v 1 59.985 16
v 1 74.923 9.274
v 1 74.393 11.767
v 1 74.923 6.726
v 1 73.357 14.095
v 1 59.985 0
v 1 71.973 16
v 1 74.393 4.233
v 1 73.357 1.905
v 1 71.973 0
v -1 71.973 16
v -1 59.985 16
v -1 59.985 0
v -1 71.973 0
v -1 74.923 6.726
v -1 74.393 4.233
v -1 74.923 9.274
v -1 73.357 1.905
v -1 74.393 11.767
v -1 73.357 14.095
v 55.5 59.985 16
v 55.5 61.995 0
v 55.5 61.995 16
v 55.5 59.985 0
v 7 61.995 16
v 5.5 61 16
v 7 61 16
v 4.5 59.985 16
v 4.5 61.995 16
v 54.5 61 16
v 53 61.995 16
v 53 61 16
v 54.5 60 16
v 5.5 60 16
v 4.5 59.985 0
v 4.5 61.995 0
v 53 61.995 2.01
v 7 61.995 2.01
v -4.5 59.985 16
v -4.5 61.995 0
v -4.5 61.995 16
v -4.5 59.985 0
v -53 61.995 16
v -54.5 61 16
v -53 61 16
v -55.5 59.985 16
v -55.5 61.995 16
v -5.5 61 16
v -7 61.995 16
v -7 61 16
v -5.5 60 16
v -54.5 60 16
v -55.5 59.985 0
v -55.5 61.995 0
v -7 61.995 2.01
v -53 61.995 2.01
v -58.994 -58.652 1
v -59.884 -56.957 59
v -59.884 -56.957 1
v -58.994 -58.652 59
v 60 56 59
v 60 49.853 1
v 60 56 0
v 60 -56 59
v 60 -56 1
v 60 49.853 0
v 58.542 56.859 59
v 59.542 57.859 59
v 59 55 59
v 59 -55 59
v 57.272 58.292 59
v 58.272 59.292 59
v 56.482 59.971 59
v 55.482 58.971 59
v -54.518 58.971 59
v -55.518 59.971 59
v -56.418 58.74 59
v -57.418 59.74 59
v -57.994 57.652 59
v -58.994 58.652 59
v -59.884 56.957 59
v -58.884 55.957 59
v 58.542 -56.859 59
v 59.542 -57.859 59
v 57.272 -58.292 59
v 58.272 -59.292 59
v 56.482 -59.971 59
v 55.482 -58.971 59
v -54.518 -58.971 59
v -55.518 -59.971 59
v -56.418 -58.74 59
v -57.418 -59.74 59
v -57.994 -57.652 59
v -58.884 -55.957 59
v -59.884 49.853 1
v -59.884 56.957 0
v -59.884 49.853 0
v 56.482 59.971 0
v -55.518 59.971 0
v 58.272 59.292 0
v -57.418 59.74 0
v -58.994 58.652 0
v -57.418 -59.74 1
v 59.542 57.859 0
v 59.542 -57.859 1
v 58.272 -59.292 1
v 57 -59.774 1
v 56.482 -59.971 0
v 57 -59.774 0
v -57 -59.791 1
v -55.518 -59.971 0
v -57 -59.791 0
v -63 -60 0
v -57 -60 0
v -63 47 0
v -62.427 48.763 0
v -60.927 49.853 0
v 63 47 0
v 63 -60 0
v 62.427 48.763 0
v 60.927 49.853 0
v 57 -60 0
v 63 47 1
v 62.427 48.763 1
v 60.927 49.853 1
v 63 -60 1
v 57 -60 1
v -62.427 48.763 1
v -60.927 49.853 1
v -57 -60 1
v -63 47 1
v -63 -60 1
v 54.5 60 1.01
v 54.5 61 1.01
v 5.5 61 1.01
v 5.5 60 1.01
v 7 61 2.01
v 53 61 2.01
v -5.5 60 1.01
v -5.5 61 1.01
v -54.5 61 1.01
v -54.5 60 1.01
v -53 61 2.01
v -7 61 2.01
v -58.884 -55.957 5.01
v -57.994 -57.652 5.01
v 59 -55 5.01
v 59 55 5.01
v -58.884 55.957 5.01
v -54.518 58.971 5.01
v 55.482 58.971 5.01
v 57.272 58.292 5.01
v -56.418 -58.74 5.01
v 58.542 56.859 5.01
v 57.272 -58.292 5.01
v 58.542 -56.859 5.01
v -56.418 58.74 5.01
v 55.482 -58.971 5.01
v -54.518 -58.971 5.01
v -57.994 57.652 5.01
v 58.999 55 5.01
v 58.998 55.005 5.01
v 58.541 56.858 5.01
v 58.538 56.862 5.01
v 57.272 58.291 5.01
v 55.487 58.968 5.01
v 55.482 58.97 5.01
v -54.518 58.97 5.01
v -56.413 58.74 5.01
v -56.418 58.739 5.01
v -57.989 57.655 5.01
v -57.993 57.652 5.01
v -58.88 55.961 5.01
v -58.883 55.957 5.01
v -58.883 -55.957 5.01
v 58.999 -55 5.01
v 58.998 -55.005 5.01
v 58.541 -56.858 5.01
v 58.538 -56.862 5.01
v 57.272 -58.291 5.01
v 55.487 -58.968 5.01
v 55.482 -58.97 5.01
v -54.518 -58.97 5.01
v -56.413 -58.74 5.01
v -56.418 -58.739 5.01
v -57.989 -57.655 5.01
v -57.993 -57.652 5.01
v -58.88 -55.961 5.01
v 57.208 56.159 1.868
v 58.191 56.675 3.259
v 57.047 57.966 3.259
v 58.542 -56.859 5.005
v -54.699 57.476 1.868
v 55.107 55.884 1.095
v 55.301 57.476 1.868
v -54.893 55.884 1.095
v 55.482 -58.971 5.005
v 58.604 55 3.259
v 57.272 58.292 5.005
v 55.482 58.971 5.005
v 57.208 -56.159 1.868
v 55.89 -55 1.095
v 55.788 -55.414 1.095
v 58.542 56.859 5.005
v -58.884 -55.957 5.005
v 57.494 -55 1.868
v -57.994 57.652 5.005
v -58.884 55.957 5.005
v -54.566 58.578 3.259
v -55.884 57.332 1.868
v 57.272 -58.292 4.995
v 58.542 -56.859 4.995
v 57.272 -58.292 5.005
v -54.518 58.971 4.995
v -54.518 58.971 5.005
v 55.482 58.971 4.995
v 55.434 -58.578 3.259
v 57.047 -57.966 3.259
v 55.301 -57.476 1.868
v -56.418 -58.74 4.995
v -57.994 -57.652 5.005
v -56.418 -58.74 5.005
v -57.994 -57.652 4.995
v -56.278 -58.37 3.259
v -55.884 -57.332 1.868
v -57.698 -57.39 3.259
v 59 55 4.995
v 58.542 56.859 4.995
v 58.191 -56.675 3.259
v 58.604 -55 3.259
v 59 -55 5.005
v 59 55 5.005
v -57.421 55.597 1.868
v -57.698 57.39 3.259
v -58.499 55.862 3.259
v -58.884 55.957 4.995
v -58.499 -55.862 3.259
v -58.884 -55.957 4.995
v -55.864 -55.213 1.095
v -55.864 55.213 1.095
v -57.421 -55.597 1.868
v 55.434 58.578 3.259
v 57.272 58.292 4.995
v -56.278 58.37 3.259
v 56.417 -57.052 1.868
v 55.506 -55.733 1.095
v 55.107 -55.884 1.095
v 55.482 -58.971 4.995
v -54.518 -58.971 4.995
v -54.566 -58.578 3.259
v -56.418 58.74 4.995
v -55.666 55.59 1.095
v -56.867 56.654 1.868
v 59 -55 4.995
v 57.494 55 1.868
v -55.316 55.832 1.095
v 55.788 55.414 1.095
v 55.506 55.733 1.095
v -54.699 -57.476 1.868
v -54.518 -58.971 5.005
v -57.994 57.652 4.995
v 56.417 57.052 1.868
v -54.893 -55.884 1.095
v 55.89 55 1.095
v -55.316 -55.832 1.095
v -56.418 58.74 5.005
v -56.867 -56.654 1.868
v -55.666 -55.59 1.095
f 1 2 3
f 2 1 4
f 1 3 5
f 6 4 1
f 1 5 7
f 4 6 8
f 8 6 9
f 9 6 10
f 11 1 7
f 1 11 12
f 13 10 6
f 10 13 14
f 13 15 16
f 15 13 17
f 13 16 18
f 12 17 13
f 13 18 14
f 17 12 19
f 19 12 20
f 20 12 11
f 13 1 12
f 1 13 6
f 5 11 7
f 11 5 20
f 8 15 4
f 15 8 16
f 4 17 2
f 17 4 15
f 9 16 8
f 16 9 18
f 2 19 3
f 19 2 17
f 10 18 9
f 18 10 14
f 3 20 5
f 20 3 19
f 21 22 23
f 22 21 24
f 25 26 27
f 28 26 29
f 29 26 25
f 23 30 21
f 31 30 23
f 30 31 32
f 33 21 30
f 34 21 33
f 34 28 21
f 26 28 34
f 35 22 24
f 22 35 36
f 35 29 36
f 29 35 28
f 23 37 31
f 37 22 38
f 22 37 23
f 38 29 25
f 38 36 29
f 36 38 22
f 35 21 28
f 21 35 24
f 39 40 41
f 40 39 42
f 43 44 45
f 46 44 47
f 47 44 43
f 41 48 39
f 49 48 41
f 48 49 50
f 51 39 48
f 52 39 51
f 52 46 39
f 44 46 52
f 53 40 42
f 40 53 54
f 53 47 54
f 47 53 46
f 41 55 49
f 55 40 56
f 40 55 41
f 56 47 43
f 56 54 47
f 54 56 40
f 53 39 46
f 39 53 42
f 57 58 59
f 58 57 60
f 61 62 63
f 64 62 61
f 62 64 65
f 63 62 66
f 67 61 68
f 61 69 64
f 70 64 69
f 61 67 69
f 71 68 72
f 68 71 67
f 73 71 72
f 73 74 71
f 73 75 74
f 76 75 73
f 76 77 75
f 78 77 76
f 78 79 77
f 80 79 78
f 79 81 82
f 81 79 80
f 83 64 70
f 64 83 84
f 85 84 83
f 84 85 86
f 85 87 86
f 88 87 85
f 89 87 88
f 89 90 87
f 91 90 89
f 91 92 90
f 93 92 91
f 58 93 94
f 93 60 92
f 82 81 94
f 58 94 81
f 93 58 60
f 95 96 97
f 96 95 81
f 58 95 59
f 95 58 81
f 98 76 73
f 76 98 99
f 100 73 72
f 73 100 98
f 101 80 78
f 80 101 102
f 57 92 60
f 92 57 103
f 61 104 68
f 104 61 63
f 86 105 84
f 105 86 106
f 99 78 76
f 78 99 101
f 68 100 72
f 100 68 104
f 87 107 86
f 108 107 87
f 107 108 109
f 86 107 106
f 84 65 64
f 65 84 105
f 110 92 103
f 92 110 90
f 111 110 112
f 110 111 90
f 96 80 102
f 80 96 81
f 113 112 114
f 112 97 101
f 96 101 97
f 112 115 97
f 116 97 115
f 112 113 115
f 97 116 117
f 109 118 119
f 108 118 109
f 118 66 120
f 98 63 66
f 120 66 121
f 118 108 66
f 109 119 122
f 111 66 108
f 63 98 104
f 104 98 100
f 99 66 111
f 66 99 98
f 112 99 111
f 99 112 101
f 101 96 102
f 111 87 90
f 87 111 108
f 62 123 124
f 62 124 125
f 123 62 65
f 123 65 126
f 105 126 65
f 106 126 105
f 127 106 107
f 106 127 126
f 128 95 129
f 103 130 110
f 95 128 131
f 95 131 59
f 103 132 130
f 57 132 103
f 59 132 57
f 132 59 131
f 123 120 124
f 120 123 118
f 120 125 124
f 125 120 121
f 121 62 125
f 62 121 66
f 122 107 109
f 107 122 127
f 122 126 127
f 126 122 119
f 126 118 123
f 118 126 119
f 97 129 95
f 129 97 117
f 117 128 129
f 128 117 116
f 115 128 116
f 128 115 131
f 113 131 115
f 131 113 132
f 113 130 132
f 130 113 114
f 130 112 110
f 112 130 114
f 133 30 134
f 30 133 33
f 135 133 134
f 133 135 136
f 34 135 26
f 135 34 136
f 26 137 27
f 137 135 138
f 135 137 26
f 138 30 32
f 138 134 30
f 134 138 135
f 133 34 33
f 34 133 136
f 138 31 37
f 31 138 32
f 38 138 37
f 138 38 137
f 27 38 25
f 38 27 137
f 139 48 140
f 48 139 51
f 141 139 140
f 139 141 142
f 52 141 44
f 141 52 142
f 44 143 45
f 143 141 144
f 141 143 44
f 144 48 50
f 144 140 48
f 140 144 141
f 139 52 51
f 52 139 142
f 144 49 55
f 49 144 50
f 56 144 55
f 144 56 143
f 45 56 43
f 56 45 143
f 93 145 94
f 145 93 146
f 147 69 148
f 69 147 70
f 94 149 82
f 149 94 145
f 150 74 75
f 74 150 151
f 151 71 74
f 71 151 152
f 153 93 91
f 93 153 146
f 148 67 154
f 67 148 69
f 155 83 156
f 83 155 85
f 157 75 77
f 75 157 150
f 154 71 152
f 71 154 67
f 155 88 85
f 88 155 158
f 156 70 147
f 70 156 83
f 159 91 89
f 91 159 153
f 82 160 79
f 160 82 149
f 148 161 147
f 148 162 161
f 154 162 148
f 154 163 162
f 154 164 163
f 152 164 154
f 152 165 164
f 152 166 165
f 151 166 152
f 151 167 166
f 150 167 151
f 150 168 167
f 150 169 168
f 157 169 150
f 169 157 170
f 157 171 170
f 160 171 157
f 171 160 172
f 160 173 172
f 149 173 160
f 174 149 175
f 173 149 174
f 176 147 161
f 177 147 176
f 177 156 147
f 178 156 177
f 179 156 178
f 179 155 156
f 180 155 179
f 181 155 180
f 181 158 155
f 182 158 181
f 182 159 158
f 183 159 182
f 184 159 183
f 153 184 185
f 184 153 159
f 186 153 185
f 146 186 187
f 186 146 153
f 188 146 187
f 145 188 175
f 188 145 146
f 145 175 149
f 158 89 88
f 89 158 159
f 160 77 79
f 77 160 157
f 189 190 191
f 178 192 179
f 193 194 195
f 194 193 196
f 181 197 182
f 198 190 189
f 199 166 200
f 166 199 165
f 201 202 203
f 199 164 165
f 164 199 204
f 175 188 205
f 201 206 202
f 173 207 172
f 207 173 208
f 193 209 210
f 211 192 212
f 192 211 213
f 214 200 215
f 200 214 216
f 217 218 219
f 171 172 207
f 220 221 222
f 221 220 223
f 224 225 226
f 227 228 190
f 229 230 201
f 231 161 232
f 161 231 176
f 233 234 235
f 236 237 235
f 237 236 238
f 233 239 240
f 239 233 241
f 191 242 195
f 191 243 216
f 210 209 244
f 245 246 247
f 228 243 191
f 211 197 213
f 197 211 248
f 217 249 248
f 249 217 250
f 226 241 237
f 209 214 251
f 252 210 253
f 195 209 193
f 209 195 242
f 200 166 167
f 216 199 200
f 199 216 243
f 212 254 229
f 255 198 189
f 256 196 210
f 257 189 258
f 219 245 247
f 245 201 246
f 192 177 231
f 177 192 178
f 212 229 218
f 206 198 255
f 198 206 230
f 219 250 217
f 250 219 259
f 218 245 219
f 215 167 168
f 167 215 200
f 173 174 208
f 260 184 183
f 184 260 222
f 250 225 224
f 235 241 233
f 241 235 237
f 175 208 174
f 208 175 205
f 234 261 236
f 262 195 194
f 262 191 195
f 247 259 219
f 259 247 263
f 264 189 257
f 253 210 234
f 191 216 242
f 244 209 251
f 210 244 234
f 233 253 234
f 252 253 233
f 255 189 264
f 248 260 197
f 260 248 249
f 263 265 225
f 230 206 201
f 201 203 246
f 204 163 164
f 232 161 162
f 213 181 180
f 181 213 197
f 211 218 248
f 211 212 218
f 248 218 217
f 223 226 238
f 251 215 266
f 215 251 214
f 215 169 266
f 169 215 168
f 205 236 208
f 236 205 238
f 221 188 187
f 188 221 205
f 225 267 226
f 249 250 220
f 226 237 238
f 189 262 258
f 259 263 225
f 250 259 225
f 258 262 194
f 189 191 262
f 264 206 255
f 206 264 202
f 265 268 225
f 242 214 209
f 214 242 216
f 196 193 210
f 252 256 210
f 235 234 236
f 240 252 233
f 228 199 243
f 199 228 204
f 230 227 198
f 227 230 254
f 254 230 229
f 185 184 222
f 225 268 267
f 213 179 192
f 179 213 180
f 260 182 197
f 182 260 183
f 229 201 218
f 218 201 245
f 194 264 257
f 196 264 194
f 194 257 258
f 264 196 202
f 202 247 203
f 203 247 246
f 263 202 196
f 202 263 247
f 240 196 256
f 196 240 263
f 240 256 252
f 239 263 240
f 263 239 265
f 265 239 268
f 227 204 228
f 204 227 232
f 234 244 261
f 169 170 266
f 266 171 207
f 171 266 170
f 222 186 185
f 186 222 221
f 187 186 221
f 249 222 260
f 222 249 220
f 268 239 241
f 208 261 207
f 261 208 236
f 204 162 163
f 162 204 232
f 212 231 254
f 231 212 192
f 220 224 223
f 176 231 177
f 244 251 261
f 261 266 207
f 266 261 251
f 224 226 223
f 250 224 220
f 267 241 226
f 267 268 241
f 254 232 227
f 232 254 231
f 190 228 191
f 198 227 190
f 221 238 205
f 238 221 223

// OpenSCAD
// Customizable Ultimate Drawer System Drawer
// Remixed from MarcElbichon's Ultimate Drawer System https://www.thingiverse.com/thing:2302575 (CC-BY 4.0)
// Copyright (C) 2019 by Brian Alano (and possibly others)
// Licensed under the Creative Commons Attribution-NonCommercial-ShareAlike 4.0 (CC-BY-NC-SA 4.0)

/* Design notes
// width is x dimension, across the face of the drawer
// depth is y dimension, front to back of the drawer
// height is z dimension
*/

/* Coding Style Guide 
 * User parameters and modules use underscores between words.
 * Other variable names use camel case.
 * Separate features into their own modules if they are more than a couple lines long.
 * All dimensions should be assigned to variables, usually global ones so they can be found easily.
 * Keep local modules local.
 * Keep local variables local.
 * Maintain Thingiverse Customizer compatibility.
 * Maintain backwards compatibility with MarcElbichon's Ultimate Drawer System 
   (https://www.thingiverse.com/thing:2302575). This means a 1Ux1Ux1U drawer 
   made with this program will work in MarcElbichon's shelf. 
*/

/* [Size] */
// units wide (actual drawer width is 131*U_wide - 10)
U_wide=1; // [1, 1.5]
// units deep (actual drawer depth is 130*U_deep - 10)
U_deep=1; // [1, 1.5]
// units high (actual drawer height is 20*U_high - 1)
U_high=3; // [1:15]

/* [Features] */
// What kind of drawer pull?
pull_style = "original"; // ["original", "ergonomic"]
// modify the flange to allow for the drawer catch on the shelf?
drawer_catch = "no"; // ["yes", "no"]
// include slots on the back of the drawer for the locking mechanism
rear_lock_slot = "no"; // ["yes", "no"]

/* [Hidden] */
drawerUnit=[120, 120, 19];
shelfPadding=[11, 10, 1];

wallThickness = 1;
shelfUnit = [131, 130, 30];
shelf = [shelfUnit.x * U_wide, shelfUnit.y * U_deep, (shelfUnit.z - wallThickness*2) * U_high - wallThickness*2]; // reference dimension from shelf .scad file.
drawer = [shelf.x - shelfPadding.x, shelf.y - shelfPadding.y, shelf.z - shelfPadding.z];

cornerR = 4;
cornerD = cornerR * 2;
flangeR = 3;
flangeD = flangeR * 2;
flange = [3, d_to_y(U_deep)-10, 1];
pullD = 24.38;
pull = [2, pullD/2 + 2.8, 16];
label = [51, 2, 16];
labelSlot = [49, 1, 15];
labelWindow = [46, 1, 14];
catch = [flange.x * 0.4, d_to_y(U_deep) - 4, flange.z];
rearLockSlot = [26, 3.5, 8];

// utility variables
epsilon = 0.01;

// the spacing between drawings is 20, or drawerUnit.z + 1. so a 1U drawer is 19, a 2U drawer is 39, etc.
//FIXME replace with drawer[]
//FIXME put lock on bottom, not top.
function u_to_z(u) = (drawerUnit.z + shelfPadding.z) * u - shelfPadding.z;
function w_to_x(w) = (drawerUnit.x + shelfPadding.x) * w - shelfPadding.x;
function d_to_y(d) = (drawerUnit.y + shelfPadding.y) * d - shelfPadding.y;

module drawer() {
    module add() {
        // main body
        linear_extrude(u_to_z(U_high))
            roundtangle(width=w_to_x(U_wide), length=d_to_y(U_deep), radius=cornerR);
        // flanges
        linear_extrude(flange.z) 
            for (i = [1, -1]) {
                translate([w_to_x(U_wide)/2*i, -d_to_y(U_deep)/2] ) {
                    translate([-flange.x, 0]) square([flange.x*2, flange.y - flangeR]);
                    translate([0, flange.y - flangeR]) circle(r=flangeR);
                }
            }
        // pull
        translate([0, d_to_y(U_deep)/2, pull.z/2]) pull(style=pull_style);
        // label holders (positive part)
        for (i = [1, -1]) {
            translate([w_to_x(U_wide)/4*i, (d_to_y(U_deep) + label.y)/2 - epsilon, label.z/2]) cube([label.x, label.y + epsilon, label.z], center=true);
        }
        // rear lock pockets
        if (rear_lock_slot == "yes")
            for(j = [1:U_high])
                translate([0, -d_to_y(U_deep)/2, u_to_z(j)]) 
                    rearLockSlot();
    }
    
    module subtract() {
        // main cut, minus fillets
        cut = [w_to_x(U_wide) - wallThickness*2, d_to_y(U_deep) - wallThickness*2, u_to_z(U_high) - wallThickness - cornerR];
        translate([0, 0, u_to_z(U_high) - cut.z + epsilon]) 
            linear_extrude(cut.z + epsilon) roundtangle(cut.x, cut.y, cornerR);
        // fillet cut
       translate([0, 0, u_to_z(U_high) - cut.z]) 
            minkowski() {
                cube([cut.x - cornerD, cut.y - cornerD, epsilon], center=true);
                sphere(d=cornerD);
            }
        for (i=[1, -1]) {
            // label cuts
            translate([w_to_x(U_wide)/4*i, d_to_y(U_deep)/2 + labelSlot.y/2, labelSlot.z/2 + (label.z - labelSlot.z) + epsilon])
                cube(labelSlot, center=true);
            translate([w_to_x(U_wide)/4*i, d_to_y(U_deep)/2 + label.y - wallThickness/2, labelWindow.z/2 + (label.z - labelWindow.z) + epsilon])
                cube(labelWindow, center=true);
            // drawer catch cutout
            if (drawer_catch == "yes") {
               translate([(w_to_x(U_wide)/2 + flange.x - catch.x/2 + epsilon)*i, 
                d_to_y(U_deep)/2 - catch.y/2, 
                catch.z/2 - epsilon])
                    cube([catch.x + epsilon, catch.y, catch.z + 2*epsilon], center=true);
            }
        }
    }
     
    difference() {
        add();  
        subtract();
    }
}

module pull(style) {
    // drawer pull
    module original() {
        intersection() {
           translate([0, pull.y/2 - epsilon]) cube([pull.x, pull.y + epsilon, pull.z], center = true);
           translate([0, pull.y - pullD/2]) rotate([0, 90, 0]) cylinder(d=pullD, h=pull.x, center = true);
        }
    }

    module ergonomic() {
        difference() {
            original();
            translate([0, pull.y - pullD/2]) rotate([0, 90, 0]) {
                intersection() {
                    cylinder(d=pullD/2, h=pull.x+epsilon*4, center = true);
                    translate([0, pullD/3]) cylinder(d=pullD/2, h=pull.x+epsilon*4, center = true);
                }
            }
        }
        scale([3, 1, 1]) difference() {
            original();
            translate([0, pull.y - pullD/2]) rotate([0, 90, 0]) cylinder(d=pullD-pull.x*2, h=pull.x+epsilon*2, center = true);
        }
    }

    if (style == "original") original();
    if (style == "ergonomic") ergonomic();
}

module rearLockSlot() {    
    module half() {
        translate([rearLockSlot.x/2, -rearLockSlot.y, -drawerUnit.z + rearLockSlot.z/2]) 
        {
            cube([wallThickness, rearLockSlot.y, rearLockSlot.z/2]);
            rotate([0, 90, 0])
                linear_extrude(wallThickness) 
                polygon([[0, 0], [rearLockSlot.y, rearLockSlot.y], [0, rearLockSlot.y]]);
        }
        translate([0, -rearLockSlot.y, -drawerUnit.z + rearLockSlot.z/2]) 
            cube([rearLockSlot.x/2, wallThickness, rearLockSlot.z/2]);
    }
    
    module add() {
        for(i=[0, 1]) 
            mirror([i, 0, 0]) half();
    }
    add();
//    half();
}

module roundtangle(width, length, radius) {
    minkowski() {
                square([width - radius*2, length - radius*2], center=true);
                circle(r=radius);
            }
}
drawer();
//pull(style="ergonomic");
//rear_lock();
